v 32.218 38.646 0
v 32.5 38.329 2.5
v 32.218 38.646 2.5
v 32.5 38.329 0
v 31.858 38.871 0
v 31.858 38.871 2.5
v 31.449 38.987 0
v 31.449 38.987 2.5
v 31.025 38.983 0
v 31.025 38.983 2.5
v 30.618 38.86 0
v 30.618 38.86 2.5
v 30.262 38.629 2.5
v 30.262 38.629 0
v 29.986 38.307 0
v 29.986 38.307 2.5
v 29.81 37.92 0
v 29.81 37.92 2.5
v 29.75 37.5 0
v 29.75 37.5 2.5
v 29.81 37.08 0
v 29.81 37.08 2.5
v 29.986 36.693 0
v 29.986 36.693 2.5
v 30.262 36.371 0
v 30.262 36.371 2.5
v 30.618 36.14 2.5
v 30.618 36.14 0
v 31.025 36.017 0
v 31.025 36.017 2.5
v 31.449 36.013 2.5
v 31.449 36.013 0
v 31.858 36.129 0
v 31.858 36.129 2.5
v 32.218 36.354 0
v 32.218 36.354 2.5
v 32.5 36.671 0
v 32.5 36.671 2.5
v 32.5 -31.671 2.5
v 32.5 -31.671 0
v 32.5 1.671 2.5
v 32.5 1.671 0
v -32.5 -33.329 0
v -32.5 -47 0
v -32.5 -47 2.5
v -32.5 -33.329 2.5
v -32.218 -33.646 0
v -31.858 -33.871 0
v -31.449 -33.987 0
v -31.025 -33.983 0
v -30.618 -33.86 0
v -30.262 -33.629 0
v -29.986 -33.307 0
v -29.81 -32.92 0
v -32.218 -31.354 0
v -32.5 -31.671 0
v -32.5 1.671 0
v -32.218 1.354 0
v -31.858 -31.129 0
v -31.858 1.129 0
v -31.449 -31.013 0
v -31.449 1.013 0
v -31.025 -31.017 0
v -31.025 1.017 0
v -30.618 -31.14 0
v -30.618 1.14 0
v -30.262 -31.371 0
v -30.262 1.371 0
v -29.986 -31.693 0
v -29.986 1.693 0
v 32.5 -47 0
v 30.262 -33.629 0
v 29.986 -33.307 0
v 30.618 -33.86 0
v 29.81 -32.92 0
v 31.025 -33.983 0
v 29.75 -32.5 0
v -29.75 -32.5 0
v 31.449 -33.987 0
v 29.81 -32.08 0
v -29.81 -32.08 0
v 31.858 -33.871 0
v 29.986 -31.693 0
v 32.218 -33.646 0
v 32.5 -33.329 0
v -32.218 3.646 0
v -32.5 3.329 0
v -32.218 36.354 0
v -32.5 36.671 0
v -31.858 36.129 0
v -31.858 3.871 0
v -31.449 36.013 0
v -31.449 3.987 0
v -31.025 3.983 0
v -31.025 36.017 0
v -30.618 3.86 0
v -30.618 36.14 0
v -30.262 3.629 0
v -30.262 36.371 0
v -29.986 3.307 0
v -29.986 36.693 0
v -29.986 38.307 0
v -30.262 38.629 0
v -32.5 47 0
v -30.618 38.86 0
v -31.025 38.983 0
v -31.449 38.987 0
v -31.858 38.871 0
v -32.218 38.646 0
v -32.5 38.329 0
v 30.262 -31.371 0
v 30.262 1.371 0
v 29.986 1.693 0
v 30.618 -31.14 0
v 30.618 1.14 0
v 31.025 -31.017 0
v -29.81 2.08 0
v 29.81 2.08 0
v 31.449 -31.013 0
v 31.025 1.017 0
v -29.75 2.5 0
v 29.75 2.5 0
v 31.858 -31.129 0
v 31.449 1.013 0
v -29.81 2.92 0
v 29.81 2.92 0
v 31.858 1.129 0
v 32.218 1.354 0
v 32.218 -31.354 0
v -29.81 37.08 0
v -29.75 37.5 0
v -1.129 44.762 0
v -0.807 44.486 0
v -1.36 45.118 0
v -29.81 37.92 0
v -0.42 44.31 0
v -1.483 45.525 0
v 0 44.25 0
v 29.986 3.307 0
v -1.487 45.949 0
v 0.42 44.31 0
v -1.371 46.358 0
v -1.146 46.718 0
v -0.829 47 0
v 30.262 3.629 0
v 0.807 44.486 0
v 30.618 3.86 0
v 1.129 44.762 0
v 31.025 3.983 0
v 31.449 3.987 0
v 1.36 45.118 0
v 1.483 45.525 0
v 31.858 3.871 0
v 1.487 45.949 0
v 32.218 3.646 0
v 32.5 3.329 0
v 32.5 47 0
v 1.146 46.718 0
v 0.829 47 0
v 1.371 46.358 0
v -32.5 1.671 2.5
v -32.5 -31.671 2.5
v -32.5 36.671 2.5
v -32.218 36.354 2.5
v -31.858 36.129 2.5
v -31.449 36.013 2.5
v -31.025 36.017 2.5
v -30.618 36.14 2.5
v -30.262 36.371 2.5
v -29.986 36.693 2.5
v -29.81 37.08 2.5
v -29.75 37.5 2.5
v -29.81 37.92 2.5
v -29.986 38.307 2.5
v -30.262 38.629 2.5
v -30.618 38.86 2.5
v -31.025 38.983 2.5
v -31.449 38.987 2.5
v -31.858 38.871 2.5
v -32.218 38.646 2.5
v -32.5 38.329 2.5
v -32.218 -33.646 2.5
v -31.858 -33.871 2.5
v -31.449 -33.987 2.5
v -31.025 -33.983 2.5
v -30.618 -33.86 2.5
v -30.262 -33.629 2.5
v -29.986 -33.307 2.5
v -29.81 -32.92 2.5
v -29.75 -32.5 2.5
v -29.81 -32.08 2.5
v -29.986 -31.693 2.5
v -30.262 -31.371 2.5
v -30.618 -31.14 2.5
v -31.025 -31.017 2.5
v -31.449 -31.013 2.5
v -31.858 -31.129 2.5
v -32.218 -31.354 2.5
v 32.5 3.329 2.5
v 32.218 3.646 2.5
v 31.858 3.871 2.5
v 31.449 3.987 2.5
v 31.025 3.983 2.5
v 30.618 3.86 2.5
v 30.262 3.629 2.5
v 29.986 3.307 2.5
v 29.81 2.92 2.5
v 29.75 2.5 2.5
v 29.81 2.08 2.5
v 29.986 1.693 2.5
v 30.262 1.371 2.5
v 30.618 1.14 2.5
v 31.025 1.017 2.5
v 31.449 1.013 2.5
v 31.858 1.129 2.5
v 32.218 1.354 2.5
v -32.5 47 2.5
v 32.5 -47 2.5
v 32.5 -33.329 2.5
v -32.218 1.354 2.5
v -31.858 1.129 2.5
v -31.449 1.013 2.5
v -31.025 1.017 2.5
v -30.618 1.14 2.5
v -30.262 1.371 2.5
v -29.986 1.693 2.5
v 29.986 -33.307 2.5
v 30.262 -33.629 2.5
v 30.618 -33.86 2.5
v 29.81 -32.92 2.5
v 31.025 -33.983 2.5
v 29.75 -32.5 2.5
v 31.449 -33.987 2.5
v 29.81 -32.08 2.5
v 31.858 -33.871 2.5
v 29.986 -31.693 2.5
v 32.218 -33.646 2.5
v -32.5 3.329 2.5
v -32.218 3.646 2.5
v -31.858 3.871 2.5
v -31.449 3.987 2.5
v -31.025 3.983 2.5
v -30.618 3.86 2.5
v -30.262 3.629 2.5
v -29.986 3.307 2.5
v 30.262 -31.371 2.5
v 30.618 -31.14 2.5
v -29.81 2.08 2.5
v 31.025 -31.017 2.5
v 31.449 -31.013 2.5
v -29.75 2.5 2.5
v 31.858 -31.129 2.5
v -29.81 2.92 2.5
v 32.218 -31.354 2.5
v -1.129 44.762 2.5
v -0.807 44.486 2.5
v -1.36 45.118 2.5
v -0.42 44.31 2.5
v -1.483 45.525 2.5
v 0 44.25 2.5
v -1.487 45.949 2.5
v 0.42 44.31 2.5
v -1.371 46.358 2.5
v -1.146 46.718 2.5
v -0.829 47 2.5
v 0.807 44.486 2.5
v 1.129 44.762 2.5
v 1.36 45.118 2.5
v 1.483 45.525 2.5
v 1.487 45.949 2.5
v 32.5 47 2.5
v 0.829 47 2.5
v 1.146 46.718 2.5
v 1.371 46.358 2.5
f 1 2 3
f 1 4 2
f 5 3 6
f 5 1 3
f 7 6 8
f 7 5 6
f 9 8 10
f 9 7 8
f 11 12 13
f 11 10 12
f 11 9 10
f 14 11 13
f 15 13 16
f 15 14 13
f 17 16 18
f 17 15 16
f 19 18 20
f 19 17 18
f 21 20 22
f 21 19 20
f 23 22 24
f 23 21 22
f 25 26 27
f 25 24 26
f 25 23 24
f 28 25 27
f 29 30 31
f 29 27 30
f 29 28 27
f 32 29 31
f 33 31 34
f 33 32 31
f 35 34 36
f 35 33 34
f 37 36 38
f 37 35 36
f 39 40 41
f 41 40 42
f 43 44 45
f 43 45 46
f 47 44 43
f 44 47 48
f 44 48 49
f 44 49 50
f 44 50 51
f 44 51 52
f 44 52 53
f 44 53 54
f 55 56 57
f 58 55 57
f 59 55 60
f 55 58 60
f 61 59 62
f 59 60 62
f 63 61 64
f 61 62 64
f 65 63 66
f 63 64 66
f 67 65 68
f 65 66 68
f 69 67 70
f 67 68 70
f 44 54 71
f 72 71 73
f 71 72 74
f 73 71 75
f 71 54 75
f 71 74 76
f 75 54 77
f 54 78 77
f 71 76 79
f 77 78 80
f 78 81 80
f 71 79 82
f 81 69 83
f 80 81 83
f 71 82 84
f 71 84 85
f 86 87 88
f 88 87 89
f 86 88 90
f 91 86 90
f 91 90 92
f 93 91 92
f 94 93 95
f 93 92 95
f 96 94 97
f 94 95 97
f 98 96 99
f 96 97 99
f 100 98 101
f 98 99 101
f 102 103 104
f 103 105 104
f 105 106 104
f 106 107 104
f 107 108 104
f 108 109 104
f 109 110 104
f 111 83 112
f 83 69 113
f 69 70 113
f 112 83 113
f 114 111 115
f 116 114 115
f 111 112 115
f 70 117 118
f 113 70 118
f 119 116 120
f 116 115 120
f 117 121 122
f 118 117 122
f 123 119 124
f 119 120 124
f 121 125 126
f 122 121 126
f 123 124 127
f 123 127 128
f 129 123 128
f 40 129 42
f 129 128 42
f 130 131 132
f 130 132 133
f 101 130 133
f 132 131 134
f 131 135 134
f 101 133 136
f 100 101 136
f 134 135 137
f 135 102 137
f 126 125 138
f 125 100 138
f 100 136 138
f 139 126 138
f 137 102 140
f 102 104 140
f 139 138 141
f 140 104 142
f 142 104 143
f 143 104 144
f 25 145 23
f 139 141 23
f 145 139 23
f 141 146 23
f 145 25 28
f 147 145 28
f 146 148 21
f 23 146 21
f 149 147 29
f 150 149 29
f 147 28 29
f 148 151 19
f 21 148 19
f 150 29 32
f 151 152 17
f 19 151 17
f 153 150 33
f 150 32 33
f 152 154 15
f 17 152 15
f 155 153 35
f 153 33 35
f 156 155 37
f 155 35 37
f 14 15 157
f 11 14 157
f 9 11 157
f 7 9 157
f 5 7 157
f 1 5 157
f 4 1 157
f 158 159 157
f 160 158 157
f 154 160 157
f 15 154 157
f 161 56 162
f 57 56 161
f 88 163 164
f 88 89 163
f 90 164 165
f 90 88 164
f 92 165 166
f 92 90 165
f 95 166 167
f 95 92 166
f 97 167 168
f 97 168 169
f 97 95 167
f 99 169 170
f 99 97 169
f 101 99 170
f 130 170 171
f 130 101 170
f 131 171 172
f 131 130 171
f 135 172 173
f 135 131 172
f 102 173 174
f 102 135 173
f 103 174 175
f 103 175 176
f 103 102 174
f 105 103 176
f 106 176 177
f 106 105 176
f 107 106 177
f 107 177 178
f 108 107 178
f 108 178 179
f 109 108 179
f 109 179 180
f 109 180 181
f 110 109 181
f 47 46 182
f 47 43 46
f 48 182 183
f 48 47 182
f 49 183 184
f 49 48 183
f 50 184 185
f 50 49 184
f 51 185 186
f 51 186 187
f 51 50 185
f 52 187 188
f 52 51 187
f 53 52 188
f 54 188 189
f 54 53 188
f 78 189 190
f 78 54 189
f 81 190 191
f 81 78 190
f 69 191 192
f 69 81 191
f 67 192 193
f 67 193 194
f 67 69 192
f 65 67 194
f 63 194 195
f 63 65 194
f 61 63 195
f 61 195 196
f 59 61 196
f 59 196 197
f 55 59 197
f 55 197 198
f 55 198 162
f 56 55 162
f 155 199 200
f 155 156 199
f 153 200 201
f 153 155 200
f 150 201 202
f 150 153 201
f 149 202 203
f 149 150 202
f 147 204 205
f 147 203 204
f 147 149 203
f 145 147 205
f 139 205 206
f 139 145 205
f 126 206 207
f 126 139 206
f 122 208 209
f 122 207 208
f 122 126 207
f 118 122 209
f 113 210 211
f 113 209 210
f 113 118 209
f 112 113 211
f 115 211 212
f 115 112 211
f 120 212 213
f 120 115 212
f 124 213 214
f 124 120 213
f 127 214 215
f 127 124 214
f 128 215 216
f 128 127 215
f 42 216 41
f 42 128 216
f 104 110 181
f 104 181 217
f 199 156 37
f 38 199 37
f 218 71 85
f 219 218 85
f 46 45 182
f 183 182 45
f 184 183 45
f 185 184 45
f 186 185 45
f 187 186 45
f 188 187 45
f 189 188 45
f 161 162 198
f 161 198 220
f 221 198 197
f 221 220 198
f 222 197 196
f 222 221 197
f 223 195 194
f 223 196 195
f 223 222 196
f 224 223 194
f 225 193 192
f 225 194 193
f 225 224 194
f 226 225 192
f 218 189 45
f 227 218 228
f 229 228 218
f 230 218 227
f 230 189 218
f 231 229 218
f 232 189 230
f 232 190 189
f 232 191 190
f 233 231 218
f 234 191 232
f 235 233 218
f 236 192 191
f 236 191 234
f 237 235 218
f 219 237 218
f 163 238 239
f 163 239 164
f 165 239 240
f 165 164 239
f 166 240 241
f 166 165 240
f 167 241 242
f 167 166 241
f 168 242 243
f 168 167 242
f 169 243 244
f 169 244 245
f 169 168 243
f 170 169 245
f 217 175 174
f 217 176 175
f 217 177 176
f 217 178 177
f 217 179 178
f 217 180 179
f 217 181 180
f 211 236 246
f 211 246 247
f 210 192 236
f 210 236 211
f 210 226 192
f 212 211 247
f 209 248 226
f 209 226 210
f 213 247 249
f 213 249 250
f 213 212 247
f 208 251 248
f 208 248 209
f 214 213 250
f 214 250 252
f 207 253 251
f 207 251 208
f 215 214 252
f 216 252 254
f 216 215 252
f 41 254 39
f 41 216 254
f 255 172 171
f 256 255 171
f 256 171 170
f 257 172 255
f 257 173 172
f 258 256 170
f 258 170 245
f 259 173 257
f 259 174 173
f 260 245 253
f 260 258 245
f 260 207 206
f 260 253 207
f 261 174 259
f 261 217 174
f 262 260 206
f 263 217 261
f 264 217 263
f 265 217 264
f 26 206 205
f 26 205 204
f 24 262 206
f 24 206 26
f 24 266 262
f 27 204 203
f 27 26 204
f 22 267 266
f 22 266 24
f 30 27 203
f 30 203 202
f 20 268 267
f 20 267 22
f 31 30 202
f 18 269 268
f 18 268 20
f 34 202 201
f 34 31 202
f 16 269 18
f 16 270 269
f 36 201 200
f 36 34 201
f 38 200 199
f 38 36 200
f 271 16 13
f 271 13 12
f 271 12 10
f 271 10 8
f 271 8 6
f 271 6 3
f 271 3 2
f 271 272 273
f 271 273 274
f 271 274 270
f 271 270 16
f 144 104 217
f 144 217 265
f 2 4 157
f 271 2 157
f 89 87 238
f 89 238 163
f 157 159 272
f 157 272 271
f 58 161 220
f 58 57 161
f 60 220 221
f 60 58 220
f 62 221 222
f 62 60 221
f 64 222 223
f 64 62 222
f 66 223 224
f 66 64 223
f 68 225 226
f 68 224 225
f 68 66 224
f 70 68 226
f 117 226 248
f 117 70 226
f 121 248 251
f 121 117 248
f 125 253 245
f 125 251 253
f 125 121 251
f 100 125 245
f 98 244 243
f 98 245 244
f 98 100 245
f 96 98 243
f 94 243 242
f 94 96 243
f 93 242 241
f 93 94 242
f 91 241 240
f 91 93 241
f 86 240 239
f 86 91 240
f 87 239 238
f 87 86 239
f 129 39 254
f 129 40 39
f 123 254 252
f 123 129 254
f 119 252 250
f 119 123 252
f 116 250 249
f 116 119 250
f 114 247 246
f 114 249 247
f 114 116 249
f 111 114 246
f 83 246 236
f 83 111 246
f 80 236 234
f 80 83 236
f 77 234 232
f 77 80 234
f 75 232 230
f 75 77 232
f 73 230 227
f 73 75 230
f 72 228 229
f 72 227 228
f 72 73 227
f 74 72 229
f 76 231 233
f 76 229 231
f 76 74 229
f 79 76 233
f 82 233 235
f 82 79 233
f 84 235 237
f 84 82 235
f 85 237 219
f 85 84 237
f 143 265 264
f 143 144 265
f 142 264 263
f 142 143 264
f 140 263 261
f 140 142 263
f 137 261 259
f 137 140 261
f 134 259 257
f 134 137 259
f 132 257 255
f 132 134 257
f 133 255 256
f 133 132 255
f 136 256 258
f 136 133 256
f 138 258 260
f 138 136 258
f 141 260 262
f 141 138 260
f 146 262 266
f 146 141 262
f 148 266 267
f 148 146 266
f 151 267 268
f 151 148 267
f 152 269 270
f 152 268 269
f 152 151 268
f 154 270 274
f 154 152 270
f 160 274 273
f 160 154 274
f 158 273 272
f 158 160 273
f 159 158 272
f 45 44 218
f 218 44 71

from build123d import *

# Parameters (mm, degrees)
SKETCH1_W               = 65
SKETCH1_H               = 94
BOSS_EXTRUDE1_DEPTH     = 2.5
CUT_EXTRUDE1_START      = -1
SKETCH2_R               = 1.5
CUT_EXTRUDE1_DEPTH      = 4.5
LPATTERN1_COUNT         = 3
LPATTERN1_PITCH         = 35
SKETCH3_R               = 1.5
CUT_EXTRUDE2_DEPTH      = 3.5
CUT_EXTRUDE2_DEPTH_BACK = 1


with BuildPart() as part:
    # Sketch1 → Boss-Extrude1 (new body)
    with BuildSketch(Plane.XY):
        Rectangle(SKETCH1_W, SKETCH1_H)
    extrude(amount=BOSS_EXTRUDE1_DEPTH)

    # Sketch2 → Cut-Extrude1 (cut)
    with BuildSketch(Plane.XY.offset(CUT_EXTRUDE1_START)):
        with Locations((-31.25, 37.5)):
            Circle(SKETCH2_R)
        with Locations((31.25, 37.5)):
            Circle(SKETCH2_R)
    cut_extrude1 = extrude(amount=CUT_EXTRUDE1_DEPTH, mode=Mode.SUBTRACT)

    # LPattern1: Cut-Extrude1 ×3
    with Locations(*[(0, -i * LPATTERN1_PITCH, 0) for i in range(1, LPATTERN1_COUNT)]):
        add(cut_extrude1, mode=Mode.SUBTRACT)

    # Sketch3 → Cut-Extrude2 (cut, two sides)
    with BuildSketch(Plane.XY) as cut_extrude2_sk:
        with Locations((0, 45.75)):
            Circle(SKETCH3_R)
    extrude(amount=CUT_EXTRUDE2_DEPTH, mode=Mode.SUBTRACT)
    extrude(cut_extrude2_sk.sketch, amount=-CUT_EXTRUDE2_DEPTH_BACK, mode=Mode.SUBTRACT)


solid = part.part
